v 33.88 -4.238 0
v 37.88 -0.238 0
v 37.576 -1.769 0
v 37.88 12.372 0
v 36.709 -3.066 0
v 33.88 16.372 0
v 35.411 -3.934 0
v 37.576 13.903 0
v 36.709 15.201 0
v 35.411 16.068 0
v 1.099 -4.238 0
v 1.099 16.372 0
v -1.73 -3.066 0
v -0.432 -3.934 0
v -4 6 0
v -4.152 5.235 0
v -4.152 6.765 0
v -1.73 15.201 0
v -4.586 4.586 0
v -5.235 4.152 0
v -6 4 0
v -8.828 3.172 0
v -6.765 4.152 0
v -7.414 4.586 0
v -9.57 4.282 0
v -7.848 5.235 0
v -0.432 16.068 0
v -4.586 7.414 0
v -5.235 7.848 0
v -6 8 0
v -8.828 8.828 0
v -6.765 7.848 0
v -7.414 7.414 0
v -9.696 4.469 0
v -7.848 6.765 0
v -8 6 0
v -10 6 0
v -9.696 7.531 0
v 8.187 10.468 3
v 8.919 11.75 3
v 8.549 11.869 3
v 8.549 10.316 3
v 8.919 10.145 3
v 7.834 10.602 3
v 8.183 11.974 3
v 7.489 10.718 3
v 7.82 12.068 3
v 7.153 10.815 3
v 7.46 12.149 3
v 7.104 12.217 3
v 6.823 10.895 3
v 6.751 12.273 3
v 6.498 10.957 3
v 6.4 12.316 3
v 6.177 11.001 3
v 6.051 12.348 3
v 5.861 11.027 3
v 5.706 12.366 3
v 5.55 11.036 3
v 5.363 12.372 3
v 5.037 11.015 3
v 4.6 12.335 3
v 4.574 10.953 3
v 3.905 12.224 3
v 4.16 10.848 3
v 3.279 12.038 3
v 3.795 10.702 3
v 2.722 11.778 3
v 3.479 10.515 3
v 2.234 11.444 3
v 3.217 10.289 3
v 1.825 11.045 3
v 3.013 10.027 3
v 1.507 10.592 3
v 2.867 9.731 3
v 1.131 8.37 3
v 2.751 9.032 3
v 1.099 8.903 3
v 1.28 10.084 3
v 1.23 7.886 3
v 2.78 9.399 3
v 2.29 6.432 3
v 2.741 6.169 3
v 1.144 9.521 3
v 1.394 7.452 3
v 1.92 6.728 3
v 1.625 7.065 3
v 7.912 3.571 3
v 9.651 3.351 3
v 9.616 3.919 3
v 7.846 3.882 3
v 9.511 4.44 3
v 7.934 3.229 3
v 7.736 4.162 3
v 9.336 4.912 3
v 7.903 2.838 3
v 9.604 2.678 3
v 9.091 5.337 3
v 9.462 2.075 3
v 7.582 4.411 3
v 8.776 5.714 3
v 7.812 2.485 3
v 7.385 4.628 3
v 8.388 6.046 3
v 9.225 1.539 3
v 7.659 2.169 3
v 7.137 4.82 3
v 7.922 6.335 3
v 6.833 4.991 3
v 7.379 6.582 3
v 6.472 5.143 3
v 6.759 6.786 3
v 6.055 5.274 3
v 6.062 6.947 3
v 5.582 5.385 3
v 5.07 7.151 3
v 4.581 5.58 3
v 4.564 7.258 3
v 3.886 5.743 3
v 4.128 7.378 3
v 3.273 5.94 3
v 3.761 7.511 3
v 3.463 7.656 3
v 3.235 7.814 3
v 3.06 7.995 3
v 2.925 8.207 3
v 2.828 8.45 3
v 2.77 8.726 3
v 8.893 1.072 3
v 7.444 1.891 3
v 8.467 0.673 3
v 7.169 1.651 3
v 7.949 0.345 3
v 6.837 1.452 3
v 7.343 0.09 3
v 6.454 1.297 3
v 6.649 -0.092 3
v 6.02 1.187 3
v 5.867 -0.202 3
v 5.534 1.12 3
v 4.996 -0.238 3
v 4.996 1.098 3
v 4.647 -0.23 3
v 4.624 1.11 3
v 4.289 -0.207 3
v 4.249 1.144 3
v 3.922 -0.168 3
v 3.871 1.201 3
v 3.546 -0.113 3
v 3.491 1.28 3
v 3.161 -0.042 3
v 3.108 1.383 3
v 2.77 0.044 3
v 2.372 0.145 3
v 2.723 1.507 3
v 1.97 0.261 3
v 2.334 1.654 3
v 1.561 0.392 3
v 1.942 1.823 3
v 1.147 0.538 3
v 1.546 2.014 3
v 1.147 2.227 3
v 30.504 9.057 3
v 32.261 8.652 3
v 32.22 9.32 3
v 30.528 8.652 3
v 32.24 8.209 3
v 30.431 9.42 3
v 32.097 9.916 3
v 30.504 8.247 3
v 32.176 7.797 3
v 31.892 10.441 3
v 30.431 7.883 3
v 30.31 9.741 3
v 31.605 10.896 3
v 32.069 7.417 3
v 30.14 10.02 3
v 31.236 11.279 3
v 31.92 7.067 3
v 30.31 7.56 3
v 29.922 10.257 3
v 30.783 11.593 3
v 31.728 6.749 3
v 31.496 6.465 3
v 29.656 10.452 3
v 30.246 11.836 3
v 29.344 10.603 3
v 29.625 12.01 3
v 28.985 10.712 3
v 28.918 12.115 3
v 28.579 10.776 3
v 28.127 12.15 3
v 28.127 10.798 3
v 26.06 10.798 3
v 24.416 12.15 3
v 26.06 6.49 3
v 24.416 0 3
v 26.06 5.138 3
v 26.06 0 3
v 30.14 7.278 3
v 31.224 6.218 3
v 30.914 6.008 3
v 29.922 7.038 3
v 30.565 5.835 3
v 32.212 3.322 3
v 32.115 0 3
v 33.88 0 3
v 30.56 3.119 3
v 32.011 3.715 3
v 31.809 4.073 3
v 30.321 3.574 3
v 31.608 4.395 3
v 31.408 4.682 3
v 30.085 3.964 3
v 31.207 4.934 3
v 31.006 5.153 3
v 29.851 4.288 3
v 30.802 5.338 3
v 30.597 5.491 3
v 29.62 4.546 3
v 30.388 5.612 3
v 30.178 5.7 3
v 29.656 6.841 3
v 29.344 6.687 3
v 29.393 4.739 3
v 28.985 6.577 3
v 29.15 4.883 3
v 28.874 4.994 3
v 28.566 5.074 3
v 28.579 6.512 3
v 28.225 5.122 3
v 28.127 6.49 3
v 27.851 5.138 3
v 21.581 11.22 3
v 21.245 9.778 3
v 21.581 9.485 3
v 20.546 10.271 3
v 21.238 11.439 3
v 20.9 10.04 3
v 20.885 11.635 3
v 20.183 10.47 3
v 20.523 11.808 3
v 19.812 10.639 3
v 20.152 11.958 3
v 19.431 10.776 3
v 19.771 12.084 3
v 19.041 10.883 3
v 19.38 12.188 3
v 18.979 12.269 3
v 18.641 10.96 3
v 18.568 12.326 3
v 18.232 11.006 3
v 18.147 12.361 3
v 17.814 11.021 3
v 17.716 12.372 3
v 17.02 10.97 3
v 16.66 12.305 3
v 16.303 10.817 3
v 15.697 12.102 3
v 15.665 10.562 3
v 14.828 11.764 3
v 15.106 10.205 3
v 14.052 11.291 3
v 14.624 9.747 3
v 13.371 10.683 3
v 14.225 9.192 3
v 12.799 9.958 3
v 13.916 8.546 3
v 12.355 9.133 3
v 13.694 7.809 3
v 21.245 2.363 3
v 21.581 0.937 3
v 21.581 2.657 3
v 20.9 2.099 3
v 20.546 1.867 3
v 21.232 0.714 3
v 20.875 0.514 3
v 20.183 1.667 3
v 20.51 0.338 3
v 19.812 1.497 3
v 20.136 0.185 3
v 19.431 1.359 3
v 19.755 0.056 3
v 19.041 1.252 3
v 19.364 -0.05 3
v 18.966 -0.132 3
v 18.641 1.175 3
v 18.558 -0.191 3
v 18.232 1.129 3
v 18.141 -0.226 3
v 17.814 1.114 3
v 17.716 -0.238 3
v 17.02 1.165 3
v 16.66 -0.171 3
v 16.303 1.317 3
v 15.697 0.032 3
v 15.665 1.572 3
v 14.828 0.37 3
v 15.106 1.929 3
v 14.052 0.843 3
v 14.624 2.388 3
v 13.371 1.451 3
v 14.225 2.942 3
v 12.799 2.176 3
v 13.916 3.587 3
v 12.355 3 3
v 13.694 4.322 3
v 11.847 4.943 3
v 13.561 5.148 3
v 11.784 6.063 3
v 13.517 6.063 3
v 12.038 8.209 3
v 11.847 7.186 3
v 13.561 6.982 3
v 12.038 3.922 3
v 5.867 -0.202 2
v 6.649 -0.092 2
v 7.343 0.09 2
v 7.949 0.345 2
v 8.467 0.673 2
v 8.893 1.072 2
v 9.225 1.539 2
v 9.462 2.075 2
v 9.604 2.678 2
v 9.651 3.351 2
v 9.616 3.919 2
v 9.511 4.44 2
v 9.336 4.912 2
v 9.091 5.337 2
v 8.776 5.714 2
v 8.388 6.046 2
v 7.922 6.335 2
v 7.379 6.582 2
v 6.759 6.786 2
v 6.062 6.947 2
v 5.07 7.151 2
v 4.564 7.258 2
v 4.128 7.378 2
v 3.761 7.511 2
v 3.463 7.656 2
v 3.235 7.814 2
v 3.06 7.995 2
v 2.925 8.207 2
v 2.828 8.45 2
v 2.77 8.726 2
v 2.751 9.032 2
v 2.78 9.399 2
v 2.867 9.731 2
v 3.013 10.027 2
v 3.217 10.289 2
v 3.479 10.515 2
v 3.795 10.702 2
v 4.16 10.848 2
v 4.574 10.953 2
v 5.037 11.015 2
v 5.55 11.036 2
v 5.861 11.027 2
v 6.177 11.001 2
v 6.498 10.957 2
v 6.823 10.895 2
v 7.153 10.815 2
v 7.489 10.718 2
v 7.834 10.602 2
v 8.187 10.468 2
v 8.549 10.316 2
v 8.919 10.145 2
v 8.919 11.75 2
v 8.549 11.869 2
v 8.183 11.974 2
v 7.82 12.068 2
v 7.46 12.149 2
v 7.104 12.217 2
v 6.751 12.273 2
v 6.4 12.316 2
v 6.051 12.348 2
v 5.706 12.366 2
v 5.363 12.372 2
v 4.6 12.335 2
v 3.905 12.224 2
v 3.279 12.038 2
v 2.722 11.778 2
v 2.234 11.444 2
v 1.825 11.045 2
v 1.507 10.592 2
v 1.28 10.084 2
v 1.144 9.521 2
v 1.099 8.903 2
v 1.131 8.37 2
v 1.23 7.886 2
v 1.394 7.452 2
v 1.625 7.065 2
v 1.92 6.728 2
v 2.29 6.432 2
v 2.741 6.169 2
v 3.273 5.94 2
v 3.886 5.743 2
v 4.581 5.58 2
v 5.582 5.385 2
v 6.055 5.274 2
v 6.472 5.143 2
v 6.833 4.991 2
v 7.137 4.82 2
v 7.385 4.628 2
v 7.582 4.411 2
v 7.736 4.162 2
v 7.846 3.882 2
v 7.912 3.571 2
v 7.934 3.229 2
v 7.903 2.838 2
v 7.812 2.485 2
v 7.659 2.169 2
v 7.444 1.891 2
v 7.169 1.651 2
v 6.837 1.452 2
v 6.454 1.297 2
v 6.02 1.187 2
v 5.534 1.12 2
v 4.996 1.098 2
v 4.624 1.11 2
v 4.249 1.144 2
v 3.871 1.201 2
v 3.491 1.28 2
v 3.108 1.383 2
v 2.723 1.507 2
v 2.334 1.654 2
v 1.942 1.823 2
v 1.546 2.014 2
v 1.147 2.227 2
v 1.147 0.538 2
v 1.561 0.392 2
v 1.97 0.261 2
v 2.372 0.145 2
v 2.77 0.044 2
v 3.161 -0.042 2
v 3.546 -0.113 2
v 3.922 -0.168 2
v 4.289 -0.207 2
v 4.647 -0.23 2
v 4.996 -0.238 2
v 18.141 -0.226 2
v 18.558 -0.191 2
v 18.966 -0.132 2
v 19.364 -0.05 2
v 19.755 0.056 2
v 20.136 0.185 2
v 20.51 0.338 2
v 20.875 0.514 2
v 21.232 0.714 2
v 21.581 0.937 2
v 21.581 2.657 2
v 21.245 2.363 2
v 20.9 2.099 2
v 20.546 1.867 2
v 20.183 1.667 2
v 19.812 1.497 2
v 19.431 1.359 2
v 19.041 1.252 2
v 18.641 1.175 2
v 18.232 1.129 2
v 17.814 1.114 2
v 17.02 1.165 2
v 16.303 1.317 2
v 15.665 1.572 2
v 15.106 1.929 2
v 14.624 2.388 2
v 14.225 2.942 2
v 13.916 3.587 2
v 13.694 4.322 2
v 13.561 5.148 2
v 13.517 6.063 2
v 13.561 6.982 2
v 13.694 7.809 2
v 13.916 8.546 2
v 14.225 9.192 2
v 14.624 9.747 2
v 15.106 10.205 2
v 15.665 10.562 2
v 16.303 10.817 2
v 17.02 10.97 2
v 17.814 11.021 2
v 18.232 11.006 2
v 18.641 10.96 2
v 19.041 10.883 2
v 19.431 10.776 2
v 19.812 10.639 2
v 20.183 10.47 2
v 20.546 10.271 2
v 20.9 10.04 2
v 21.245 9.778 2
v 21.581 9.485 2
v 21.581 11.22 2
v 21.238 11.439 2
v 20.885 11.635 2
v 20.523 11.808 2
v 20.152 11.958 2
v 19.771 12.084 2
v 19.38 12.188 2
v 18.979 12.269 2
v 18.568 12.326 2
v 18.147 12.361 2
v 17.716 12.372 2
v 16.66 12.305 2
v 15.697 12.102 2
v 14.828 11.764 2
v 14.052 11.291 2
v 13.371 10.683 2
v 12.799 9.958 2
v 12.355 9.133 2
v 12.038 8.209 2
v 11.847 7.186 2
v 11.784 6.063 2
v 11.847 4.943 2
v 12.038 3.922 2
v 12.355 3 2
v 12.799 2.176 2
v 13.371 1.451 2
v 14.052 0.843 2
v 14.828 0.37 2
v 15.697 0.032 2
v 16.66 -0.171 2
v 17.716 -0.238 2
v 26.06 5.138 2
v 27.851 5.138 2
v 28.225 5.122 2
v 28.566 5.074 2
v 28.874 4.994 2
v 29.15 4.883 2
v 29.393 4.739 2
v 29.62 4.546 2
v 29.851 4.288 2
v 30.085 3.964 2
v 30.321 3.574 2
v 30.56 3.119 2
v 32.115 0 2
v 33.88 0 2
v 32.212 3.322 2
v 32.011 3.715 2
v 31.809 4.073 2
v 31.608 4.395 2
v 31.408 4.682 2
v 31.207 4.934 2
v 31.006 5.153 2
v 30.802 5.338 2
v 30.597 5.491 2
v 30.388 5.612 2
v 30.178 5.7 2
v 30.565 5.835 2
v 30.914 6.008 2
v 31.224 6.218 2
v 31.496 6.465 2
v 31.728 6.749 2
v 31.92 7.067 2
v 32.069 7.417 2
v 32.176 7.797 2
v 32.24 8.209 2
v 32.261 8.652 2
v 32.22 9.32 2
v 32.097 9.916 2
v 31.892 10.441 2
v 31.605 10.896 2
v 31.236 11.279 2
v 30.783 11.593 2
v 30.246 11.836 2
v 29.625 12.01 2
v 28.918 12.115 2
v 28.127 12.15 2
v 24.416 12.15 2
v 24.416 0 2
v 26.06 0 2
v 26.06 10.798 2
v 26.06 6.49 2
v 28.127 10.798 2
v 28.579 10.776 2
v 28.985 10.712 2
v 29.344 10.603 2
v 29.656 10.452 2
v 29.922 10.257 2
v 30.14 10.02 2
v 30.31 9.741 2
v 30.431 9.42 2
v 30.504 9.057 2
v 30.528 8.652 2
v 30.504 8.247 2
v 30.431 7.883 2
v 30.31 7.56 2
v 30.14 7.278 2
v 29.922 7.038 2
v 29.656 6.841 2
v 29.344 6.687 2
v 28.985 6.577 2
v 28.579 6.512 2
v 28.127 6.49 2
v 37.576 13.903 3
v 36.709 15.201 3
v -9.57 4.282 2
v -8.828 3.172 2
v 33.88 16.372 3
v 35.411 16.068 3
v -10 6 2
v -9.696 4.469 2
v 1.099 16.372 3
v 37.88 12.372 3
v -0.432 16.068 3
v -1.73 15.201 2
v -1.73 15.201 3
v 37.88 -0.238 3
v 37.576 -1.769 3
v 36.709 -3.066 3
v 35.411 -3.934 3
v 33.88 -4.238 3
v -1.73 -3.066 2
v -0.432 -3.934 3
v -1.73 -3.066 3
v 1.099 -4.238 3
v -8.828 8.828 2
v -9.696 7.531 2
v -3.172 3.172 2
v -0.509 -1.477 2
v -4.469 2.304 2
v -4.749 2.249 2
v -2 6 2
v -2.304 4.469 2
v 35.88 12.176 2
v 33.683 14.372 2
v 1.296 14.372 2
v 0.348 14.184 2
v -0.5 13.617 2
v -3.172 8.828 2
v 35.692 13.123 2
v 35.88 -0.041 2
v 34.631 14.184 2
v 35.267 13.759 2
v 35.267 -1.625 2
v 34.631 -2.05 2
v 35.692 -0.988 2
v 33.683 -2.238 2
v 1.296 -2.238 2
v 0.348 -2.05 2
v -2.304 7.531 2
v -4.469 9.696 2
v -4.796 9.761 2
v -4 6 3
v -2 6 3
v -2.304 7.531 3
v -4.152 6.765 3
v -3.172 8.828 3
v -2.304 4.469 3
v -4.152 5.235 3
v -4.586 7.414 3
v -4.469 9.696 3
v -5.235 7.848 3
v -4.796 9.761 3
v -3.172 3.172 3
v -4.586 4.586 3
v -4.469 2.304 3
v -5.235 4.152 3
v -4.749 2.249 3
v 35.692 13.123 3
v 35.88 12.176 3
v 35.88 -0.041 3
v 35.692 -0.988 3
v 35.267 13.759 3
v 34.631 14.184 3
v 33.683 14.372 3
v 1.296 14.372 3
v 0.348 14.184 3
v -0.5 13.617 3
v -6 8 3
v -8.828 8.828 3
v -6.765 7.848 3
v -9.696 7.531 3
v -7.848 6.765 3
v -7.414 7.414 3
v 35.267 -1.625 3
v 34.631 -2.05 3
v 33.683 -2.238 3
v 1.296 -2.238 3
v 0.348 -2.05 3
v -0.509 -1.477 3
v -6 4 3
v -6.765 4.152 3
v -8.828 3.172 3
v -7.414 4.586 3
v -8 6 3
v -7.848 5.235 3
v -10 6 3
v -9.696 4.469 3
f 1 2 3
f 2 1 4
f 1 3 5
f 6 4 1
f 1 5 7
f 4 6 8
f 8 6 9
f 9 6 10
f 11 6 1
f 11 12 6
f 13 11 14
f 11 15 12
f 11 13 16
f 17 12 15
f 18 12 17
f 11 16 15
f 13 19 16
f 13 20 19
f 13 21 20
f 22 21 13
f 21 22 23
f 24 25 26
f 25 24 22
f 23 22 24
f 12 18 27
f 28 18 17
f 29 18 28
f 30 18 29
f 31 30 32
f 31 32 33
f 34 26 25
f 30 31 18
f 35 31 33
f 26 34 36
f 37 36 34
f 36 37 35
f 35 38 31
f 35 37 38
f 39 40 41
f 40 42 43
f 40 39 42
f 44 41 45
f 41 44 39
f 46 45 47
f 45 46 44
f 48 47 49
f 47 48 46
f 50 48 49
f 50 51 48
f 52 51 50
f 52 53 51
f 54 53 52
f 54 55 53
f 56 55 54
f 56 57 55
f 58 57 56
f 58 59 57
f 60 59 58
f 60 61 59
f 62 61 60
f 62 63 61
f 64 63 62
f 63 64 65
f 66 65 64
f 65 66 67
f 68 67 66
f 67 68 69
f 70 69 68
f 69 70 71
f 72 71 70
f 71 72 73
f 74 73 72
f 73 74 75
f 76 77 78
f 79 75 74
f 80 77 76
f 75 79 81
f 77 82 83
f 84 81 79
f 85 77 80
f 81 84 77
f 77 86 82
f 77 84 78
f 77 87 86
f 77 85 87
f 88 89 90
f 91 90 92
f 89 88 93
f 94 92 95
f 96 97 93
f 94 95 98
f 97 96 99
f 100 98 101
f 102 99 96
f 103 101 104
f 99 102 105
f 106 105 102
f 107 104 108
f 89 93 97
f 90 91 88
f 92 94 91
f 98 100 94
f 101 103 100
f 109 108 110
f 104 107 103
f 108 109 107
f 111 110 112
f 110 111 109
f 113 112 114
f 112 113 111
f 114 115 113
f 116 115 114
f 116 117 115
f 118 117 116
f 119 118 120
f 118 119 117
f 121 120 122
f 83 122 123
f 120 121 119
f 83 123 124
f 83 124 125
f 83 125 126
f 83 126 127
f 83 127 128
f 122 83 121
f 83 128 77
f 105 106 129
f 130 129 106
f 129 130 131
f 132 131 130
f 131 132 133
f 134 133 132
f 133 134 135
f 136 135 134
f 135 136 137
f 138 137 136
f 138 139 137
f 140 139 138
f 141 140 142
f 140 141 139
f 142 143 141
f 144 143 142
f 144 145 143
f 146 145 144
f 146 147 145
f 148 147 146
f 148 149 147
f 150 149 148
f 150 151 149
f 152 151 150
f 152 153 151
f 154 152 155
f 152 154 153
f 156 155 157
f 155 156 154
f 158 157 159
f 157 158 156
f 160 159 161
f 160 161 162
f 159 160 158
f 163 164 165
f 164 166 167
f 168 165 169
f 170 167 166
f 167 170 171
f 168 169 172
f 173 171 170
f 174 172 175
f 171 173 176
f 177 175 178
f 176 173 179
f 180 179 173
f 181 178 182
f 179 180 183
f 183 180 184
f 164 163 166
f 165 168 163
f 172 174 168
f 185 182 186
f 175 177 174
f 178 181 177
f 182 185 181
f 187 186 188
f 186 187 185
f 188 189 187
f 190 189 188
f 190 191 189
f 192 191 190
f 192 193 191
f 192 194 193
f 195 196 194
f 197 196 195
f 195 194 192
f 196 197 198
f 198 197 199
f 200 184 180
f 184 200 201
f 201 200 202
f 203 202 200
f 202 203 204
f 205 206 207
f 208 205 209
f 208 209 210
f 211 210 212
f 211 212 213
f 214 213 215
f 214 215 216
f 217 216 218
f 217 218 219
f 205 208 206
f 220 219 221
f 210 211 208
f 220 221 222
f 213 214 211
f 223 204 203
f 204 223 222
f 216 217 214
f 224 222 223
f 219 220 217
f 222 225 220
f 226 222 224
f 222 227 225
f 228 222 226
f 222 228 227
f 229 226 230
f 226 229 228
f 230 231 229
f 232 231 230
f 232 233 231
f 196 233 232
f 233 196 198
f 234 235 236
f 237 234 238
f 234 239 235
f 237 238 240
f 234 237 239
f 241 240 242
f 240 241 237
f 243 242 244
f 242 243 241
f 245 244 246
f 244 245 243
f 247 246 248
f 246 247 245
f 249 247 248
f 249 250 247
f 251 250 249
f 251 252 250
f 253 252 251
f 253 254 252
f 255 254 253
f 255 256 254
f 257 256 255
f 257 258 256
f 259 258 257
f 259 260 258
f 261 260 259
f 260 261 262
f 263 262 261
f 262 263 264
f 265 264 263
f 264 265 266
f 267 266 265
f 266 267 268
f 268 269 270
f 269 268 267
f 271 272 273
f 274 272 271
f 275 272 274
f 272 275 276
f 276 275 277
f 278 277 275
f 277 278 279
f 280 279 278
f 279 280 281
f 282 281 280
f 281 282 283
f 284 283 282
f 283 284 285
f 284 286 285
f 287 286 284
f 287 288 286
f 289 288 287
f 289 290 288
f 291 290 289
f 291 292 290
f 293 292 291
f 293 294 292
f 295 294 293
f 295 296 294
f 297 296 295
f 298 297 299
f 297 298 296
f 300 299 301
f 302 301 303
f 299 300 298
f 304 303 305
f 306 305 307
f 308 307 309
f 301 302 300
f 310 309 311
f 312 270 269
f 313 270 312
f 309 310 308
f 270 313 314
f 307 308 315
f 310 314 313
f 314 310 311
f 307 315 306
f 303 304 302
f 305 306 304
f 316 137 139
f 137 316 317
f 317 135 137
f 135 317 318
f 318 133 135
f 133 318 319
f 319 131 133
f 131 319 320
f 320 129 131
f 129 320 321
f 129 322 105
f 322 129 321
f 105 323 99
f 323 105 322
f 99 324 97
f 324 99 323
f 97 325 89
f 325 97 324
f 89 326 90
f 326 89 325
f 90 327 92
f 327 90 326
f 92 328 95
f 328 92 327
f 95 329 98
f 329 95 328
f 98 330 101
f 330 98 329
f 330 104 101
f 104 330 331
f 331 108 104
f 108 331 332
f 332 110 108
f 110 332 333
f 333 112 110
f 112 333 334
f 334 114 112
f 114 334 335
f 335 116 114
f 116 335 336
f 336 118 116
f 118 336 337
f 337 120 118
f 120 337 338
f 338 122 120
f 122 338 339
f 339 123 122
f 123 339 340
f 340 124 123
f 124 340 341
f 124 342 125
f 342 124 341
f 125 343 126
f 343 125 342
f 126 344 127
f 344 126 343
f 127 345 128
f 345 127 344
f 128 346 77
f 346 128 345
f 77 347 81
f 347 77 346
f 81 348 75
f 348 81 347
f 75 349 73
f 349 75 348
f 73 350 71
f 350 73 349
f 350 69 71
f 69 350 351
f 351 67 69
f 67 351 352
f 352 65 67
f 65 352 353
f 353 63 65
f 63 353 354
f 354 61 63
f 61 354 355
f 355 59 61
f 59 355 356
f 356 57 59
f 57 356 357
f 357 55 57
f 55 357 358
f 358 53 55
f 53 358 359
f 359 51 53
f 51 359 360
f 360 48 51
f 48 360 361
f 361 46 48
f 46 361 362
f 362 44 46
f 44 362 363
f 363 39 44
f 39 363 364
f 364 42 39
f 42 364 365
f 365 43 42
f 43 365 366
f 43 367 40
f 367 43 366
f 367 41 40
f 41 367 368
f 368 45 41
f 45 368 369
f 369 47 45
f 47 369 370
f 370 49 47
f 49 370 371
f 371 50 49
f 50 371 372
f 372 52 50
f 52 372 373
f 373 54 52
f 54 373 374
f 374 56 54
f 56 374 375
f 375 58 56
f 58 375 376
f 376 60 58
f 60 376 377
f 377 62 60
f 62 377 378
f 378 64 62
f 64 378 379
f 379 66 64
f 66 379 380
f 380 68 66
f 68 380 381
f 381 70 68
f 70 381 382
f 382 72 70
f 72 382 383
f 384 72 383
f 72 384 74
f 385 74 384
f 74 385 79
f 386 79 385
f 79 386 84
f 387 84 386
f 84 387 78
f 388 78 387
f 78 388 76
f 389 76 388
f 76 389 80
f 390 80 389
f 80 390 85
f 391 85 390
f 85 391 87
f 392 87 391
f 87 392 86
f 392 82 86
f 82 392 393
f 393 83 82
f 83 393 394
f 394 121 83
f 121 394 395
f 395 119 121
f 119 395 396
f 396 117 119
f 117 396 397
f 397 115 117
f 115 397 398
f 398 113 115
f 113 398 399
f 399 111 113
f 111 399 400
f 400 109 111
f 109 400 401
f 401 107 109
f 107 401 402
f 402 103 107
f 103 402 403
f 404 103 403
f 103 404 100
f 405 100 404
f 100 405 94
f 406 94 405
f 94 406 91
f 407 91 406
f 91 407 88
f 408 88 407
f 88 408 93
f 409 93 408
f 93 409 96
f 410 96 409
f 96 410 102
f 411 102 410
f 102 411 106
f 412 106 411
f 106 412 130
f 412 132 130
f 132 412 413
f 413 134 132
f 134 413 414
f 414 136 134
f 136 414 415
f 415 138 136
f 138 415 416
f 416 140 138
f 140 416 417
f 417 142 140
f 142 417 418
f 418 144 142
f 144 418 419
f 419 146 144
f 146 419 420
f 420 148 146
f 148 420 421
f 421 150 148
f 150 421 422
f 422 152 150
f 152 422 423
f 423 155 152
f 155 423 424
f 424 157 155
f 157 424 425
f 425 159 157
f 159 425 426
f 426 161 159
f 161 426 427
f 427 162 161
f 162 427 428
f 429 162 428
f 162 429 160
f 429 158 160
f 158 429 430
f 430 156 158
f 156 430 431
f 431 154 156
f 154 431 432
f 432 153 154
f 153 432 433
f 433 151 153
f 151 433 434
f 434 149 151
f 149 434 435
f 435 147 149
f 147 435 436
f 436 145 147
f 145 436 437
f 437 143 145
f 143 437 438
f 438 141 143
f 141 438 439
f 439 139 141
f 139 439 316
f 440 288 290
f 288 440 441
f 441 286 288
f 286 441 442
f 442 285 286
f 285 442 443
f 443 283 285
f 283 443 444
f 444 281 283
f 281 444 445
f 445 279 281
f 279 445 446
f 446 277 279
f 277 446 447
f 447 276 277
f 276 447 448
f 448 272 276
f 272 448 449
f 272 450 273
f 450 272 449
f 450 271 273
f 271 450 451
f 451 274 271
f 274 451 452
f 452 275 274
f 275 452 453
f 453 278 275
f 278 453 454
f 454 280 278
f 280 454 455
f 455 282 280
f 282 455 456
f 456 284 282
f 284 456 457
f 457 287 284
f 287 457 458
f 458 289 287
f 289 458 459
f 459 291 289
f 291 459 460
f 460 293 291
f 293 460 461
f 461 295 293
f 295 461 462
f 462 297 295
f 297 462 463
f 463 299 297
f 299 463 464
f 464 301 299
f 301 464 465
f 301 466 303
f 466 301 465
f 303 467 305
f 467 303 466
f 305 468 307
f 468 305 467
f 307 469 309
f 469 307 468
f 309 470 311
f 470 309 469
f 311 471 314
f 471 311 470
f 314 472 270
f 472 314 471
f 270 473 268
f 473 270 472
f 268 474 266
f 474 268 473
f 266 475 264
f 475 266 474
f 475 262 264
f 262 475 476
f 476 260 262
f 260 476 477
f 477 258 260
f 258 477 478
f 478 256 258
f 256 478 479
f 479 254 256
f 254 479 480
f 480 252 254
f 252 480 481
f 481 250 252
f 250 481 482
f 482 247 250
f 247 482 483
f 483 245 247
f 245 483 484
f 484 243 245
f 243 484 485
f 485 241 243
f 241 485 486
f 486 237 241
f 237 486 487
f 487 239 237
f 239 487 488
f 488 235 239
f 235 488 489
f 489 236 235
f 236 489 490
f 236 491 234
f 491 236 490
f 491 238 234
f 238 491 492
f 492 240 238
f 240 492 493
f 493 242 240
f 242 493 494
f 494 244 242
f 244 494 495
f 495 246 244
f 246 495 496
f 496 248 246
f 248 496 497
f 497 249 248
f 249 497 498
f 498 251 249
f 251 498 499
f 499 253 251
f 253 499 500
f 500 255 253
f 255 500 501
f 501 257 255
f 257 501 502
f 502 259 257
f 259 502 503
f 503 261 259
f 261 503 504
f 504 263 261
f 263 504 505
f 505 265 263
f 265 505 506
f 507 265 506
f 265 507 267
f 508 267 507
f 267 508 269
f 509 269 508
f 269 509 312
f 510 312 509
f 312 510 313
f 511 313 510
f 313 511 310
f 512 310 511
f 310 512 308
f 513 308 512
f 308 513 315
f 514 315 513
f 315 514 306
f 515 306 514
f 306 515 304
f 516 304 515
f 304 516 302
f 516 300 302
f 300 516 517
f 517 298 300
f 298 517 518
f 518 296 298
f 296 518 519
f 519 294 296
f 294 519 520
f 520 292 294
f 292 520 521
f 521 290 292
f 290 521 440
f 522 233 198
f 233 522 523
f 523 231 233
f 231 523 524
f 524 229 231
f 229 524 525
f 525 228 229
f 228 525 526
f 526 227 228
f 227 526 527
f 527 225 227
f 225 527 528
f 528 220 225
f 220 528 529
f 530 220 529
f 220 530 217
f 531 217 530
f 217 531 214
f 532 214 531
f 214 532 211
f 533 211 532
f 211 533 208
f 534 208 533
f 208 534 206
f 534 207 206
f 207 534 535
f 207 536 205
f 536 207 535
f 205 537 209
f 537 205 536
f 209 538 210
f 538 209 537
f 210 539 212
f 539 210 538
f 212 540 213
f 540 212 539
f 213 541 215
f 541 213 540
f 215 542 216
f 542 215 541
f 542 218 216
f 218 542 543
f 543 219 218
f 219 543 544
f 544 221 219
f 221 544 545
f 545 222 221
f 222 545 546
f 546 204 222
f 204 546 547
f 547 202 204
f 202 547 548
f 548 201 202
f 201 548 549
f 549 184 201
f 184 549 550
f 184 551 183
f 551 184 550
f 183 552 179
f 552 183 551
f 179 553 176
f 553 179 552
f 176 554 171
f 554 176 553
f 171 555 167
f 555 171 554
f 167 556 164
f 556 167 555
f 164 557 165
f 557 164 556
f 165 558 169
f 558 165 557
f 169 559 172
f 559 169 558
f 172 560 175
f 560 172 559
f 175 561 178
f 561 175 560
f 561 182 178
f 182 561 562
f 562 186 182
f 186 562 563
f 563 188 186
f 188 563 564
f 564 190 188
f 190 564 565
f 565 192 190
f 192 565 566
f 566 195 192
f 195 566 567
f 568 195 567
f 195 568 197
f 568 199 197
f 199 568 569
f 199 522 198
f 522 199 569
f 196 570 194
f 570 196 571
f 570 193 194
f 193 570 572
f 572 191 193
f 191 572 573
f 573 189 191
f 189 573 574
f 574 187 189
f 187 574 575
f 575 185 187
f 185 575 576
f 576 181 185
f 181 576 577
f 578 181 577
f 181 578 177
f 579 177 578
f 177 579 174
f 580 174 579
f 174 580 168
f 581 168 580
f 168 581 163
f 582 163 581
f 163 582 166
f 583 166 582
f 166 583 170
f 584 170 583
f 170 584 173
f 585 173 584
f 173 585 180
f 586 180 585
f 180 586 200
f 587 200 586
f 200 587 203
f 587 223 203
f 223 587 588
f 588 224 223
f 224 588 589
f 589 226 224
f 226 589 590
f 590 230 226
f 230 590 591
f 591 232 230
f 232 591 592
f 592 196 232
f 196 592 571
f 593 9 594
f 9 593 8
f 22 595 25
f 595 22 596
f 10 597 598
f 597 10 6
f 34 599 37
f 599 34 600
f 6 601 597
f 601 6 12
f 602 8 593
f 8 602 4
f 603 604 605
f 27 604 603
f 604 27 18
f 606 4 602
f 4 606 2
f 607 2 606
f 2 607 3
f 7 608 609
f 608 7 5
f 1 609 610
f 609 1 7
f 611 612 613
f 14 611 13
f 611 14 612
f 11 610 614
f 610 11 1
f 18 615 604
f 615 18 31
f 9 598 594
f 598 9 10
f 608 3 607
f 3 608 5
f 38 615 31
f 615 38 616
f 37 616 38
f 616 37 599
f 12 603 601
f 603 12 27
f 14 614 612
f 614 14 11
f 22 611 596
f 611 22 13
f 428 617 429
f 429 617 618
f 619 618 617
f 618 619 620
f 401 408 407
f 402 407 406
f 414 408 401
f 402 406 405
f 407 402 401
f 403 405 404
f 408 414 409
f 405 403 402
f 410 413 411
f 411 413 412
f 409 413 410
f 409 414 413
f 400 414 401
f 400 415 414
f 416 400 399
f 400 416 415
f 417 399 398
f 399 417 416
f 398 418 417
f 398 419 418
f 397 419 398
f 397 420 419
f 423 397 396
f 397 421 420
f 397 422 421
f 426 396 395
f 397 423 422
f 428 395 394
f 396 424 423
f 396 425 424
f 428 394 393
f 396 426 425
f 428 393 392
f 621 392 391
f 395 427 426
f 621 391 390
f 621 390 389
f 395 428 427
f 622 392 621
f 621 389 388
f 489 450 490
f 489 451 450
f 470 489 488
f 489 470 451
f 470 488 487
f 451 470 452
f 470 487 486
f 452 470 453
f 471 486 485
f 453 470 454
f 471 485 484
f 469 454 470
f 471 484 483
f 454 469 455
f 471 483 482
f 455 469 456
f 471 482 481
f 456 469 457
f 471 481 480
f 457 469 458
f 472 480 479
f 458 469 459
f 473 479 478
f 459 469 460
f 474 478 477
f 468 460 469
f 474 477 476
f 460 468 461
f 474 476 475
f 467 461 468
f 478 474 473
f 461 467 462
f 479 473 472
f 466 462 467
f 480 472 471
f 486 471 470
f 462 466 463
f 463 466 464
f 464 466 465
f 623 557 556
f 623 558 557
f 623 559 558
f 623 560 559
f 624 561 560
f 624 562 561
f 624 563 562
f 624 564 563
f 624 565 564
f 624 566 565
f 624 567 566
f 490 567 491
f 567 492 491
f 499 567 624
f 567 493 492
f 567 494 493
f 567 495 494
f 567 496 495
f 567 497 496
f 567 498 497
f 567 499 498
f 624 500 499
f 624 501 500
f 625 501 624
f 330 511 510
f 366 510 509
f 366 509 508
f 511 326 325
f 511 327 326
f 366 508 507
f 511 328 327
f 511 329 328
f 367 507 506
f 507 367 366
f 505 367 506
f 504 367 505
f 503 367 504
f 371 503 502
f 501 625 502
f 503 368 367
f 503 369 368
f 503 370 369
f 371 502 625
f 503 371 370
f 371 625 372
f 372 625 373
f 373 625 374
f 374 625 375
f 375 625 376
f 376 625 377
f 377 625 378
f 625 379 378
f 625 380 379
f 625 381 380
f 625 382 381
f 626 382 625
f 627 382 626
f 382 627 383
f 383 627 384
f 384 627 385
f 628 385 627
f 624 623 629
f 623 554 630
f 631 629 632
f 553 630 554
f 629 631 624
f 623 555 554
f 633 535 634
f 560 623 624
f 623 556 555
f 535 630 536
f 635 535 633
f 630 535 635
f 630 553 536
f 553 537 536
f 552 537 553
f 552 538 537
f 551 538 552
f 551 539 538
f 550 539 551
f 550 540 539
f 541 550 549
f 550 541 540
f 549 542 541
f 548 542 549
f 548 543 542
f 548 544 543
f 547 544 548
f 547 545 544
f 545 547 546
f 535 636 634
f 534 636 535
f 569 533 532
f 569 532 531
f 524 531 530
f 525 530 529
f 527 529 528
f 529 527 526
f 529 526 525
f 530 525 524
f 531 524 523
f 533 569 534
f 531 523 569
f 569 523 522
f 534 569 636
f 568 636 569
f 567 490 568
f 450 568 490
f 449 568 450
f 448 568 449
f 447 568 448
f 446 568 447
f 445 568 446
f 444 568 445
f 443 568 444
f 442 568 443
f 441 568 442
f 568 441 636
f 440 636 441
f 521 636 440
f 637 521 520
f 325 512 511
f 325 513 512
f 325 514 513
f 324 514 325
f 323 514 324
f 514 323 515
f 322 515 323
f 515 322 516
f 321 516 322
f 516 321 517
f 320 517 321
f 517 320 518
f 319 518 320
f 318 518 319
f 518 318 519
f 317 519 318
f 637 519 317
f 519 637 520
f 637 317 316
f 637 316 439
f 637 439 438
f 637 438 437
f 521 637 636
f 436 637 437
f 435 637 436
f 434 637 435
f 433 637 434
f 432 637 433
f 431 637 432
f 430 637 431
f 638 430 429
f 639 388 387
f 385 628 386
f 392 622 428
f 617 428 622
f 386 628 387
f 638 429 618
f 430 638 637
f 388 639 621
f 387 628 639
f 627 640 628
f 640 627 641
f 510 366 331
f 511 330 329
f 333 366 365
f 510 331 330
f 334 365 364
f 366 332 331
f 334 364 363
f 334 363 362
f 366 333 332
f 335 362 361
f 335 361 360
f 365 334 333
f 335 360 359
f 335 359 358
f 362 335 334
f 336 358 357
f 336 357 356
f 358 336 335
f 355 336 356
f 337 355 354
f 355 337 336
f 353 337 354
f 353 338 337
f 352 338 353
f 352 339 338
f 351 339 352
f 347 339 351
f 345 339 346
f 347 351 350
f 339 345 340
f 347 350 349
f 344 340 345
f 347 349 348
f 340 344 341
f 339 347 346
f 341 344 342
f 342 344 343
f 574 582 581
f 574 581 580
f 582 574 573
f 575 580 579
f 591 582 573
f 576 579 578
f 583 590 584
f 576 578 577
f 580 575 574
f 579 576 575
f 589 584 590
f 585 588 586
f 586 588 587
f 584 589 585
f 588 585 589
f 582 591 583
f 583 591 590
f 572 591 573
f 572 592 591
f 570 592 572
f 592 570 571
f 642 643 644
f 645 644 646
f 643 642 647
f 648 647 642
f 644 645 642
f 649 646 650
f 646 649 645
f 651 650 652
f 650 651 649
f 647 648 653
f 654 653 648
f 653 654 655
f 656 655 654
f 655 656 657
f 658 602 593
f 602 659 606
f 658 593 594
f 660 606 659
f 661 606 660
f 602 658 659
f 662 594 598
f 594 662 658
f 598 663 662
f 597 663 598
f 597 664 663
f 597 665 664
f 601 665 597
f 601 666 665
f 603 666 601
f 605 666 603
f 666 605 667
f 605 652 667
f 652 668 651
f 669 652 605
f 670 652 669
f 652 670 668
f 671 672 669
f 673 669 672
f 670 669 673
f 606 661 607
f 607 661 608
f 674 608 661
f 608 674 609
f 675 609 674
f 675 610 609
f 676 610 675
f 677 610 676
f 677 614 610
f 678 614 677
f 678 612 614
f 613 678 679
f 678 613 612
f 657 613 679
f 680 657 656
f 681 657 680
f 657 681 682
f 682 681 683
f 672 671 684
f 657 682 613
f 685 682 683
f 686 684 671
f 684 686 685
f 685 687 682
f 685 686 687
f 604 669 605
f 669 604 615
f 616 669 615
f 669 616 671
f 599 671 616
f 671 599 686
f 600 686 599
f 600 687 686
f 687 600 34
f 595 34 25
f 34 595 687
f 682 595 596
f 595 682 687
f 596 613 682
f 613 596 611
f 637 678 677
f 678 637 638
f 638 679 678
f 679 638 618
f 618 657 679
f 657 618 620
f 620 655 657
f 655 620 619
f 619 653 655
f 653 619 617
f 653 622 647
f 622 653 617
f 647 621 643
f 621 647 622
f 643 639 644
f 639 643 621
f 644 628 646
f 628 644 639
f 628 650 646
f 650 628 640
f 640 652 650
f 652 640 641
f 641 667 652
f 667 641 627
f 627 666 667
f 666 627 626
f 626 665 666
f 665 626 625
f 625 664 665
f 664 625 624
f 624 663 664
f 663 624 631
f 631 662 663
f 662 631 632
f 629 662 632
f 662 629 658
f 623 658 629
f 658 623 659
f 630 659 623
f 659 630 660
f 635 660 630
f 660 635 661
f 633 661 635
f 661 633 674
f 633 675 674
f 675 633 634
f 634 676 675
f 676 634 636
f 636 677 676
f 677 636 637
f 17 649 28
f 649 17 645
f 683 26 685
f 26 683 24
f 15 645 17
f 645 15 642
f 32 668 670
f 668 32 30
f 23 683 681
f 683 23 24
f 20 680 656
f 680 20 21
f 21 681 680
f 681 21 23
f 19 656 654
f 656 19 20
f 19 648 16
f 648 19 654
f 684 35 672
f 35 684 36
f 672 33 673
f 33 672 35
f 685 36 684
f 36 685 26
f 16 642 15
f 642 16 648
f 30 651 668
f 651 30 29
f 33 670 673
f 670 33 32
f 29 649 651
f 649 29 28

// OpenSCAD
// customizable bagtag - scruss, 2018-08

//CUSTOMIZER VARIABLES
// Uppercase is best
Your_Tag_Text="SCR";
//CUSTOMIZER VARIABLES END

module bbox_2d() {
    /*
    simple unified bounding box for 2D paths, inspired by  https://en.wikibooks.org/wiki/OpenSCAD_User_Manual/Commented_Example_Projects#Bounding_Box 
    */
    intersection() {
        projection(cut=false)rotate([90,0,0])linear_extrude(center=true, height=1000, convexity=10)hull()children(0);
        projection(cut=false)rotate([0,90,0])linear_extrude(center=true, height=1000, convexity=10)hull()children(0);
    }
}

$fn=16;

module txt() {
    text(Your_Tag_Text, font="Roboto:style=Black", spacing=1.05, size=12, $fn=32);
}

module outl() {
    hull() {
        offset(r=4)bbox_2d()txt();
        translate([-6,6])circle(d=8, center=true);
    }
}
    

difference() {
    union() {
        linear_extrude(height=3)txt();
        linear_extrude(height=2)outl();
        linear_extrude(height=3) {
            difference() {
                outl();
                offset(r=-2)outl();
            }
            translate([-6,6])circle(d=8, center=true);
        }
    }
    linear_extrude(height=8, center=true)translate([-6,6])circle(d=4, center=true);
}
